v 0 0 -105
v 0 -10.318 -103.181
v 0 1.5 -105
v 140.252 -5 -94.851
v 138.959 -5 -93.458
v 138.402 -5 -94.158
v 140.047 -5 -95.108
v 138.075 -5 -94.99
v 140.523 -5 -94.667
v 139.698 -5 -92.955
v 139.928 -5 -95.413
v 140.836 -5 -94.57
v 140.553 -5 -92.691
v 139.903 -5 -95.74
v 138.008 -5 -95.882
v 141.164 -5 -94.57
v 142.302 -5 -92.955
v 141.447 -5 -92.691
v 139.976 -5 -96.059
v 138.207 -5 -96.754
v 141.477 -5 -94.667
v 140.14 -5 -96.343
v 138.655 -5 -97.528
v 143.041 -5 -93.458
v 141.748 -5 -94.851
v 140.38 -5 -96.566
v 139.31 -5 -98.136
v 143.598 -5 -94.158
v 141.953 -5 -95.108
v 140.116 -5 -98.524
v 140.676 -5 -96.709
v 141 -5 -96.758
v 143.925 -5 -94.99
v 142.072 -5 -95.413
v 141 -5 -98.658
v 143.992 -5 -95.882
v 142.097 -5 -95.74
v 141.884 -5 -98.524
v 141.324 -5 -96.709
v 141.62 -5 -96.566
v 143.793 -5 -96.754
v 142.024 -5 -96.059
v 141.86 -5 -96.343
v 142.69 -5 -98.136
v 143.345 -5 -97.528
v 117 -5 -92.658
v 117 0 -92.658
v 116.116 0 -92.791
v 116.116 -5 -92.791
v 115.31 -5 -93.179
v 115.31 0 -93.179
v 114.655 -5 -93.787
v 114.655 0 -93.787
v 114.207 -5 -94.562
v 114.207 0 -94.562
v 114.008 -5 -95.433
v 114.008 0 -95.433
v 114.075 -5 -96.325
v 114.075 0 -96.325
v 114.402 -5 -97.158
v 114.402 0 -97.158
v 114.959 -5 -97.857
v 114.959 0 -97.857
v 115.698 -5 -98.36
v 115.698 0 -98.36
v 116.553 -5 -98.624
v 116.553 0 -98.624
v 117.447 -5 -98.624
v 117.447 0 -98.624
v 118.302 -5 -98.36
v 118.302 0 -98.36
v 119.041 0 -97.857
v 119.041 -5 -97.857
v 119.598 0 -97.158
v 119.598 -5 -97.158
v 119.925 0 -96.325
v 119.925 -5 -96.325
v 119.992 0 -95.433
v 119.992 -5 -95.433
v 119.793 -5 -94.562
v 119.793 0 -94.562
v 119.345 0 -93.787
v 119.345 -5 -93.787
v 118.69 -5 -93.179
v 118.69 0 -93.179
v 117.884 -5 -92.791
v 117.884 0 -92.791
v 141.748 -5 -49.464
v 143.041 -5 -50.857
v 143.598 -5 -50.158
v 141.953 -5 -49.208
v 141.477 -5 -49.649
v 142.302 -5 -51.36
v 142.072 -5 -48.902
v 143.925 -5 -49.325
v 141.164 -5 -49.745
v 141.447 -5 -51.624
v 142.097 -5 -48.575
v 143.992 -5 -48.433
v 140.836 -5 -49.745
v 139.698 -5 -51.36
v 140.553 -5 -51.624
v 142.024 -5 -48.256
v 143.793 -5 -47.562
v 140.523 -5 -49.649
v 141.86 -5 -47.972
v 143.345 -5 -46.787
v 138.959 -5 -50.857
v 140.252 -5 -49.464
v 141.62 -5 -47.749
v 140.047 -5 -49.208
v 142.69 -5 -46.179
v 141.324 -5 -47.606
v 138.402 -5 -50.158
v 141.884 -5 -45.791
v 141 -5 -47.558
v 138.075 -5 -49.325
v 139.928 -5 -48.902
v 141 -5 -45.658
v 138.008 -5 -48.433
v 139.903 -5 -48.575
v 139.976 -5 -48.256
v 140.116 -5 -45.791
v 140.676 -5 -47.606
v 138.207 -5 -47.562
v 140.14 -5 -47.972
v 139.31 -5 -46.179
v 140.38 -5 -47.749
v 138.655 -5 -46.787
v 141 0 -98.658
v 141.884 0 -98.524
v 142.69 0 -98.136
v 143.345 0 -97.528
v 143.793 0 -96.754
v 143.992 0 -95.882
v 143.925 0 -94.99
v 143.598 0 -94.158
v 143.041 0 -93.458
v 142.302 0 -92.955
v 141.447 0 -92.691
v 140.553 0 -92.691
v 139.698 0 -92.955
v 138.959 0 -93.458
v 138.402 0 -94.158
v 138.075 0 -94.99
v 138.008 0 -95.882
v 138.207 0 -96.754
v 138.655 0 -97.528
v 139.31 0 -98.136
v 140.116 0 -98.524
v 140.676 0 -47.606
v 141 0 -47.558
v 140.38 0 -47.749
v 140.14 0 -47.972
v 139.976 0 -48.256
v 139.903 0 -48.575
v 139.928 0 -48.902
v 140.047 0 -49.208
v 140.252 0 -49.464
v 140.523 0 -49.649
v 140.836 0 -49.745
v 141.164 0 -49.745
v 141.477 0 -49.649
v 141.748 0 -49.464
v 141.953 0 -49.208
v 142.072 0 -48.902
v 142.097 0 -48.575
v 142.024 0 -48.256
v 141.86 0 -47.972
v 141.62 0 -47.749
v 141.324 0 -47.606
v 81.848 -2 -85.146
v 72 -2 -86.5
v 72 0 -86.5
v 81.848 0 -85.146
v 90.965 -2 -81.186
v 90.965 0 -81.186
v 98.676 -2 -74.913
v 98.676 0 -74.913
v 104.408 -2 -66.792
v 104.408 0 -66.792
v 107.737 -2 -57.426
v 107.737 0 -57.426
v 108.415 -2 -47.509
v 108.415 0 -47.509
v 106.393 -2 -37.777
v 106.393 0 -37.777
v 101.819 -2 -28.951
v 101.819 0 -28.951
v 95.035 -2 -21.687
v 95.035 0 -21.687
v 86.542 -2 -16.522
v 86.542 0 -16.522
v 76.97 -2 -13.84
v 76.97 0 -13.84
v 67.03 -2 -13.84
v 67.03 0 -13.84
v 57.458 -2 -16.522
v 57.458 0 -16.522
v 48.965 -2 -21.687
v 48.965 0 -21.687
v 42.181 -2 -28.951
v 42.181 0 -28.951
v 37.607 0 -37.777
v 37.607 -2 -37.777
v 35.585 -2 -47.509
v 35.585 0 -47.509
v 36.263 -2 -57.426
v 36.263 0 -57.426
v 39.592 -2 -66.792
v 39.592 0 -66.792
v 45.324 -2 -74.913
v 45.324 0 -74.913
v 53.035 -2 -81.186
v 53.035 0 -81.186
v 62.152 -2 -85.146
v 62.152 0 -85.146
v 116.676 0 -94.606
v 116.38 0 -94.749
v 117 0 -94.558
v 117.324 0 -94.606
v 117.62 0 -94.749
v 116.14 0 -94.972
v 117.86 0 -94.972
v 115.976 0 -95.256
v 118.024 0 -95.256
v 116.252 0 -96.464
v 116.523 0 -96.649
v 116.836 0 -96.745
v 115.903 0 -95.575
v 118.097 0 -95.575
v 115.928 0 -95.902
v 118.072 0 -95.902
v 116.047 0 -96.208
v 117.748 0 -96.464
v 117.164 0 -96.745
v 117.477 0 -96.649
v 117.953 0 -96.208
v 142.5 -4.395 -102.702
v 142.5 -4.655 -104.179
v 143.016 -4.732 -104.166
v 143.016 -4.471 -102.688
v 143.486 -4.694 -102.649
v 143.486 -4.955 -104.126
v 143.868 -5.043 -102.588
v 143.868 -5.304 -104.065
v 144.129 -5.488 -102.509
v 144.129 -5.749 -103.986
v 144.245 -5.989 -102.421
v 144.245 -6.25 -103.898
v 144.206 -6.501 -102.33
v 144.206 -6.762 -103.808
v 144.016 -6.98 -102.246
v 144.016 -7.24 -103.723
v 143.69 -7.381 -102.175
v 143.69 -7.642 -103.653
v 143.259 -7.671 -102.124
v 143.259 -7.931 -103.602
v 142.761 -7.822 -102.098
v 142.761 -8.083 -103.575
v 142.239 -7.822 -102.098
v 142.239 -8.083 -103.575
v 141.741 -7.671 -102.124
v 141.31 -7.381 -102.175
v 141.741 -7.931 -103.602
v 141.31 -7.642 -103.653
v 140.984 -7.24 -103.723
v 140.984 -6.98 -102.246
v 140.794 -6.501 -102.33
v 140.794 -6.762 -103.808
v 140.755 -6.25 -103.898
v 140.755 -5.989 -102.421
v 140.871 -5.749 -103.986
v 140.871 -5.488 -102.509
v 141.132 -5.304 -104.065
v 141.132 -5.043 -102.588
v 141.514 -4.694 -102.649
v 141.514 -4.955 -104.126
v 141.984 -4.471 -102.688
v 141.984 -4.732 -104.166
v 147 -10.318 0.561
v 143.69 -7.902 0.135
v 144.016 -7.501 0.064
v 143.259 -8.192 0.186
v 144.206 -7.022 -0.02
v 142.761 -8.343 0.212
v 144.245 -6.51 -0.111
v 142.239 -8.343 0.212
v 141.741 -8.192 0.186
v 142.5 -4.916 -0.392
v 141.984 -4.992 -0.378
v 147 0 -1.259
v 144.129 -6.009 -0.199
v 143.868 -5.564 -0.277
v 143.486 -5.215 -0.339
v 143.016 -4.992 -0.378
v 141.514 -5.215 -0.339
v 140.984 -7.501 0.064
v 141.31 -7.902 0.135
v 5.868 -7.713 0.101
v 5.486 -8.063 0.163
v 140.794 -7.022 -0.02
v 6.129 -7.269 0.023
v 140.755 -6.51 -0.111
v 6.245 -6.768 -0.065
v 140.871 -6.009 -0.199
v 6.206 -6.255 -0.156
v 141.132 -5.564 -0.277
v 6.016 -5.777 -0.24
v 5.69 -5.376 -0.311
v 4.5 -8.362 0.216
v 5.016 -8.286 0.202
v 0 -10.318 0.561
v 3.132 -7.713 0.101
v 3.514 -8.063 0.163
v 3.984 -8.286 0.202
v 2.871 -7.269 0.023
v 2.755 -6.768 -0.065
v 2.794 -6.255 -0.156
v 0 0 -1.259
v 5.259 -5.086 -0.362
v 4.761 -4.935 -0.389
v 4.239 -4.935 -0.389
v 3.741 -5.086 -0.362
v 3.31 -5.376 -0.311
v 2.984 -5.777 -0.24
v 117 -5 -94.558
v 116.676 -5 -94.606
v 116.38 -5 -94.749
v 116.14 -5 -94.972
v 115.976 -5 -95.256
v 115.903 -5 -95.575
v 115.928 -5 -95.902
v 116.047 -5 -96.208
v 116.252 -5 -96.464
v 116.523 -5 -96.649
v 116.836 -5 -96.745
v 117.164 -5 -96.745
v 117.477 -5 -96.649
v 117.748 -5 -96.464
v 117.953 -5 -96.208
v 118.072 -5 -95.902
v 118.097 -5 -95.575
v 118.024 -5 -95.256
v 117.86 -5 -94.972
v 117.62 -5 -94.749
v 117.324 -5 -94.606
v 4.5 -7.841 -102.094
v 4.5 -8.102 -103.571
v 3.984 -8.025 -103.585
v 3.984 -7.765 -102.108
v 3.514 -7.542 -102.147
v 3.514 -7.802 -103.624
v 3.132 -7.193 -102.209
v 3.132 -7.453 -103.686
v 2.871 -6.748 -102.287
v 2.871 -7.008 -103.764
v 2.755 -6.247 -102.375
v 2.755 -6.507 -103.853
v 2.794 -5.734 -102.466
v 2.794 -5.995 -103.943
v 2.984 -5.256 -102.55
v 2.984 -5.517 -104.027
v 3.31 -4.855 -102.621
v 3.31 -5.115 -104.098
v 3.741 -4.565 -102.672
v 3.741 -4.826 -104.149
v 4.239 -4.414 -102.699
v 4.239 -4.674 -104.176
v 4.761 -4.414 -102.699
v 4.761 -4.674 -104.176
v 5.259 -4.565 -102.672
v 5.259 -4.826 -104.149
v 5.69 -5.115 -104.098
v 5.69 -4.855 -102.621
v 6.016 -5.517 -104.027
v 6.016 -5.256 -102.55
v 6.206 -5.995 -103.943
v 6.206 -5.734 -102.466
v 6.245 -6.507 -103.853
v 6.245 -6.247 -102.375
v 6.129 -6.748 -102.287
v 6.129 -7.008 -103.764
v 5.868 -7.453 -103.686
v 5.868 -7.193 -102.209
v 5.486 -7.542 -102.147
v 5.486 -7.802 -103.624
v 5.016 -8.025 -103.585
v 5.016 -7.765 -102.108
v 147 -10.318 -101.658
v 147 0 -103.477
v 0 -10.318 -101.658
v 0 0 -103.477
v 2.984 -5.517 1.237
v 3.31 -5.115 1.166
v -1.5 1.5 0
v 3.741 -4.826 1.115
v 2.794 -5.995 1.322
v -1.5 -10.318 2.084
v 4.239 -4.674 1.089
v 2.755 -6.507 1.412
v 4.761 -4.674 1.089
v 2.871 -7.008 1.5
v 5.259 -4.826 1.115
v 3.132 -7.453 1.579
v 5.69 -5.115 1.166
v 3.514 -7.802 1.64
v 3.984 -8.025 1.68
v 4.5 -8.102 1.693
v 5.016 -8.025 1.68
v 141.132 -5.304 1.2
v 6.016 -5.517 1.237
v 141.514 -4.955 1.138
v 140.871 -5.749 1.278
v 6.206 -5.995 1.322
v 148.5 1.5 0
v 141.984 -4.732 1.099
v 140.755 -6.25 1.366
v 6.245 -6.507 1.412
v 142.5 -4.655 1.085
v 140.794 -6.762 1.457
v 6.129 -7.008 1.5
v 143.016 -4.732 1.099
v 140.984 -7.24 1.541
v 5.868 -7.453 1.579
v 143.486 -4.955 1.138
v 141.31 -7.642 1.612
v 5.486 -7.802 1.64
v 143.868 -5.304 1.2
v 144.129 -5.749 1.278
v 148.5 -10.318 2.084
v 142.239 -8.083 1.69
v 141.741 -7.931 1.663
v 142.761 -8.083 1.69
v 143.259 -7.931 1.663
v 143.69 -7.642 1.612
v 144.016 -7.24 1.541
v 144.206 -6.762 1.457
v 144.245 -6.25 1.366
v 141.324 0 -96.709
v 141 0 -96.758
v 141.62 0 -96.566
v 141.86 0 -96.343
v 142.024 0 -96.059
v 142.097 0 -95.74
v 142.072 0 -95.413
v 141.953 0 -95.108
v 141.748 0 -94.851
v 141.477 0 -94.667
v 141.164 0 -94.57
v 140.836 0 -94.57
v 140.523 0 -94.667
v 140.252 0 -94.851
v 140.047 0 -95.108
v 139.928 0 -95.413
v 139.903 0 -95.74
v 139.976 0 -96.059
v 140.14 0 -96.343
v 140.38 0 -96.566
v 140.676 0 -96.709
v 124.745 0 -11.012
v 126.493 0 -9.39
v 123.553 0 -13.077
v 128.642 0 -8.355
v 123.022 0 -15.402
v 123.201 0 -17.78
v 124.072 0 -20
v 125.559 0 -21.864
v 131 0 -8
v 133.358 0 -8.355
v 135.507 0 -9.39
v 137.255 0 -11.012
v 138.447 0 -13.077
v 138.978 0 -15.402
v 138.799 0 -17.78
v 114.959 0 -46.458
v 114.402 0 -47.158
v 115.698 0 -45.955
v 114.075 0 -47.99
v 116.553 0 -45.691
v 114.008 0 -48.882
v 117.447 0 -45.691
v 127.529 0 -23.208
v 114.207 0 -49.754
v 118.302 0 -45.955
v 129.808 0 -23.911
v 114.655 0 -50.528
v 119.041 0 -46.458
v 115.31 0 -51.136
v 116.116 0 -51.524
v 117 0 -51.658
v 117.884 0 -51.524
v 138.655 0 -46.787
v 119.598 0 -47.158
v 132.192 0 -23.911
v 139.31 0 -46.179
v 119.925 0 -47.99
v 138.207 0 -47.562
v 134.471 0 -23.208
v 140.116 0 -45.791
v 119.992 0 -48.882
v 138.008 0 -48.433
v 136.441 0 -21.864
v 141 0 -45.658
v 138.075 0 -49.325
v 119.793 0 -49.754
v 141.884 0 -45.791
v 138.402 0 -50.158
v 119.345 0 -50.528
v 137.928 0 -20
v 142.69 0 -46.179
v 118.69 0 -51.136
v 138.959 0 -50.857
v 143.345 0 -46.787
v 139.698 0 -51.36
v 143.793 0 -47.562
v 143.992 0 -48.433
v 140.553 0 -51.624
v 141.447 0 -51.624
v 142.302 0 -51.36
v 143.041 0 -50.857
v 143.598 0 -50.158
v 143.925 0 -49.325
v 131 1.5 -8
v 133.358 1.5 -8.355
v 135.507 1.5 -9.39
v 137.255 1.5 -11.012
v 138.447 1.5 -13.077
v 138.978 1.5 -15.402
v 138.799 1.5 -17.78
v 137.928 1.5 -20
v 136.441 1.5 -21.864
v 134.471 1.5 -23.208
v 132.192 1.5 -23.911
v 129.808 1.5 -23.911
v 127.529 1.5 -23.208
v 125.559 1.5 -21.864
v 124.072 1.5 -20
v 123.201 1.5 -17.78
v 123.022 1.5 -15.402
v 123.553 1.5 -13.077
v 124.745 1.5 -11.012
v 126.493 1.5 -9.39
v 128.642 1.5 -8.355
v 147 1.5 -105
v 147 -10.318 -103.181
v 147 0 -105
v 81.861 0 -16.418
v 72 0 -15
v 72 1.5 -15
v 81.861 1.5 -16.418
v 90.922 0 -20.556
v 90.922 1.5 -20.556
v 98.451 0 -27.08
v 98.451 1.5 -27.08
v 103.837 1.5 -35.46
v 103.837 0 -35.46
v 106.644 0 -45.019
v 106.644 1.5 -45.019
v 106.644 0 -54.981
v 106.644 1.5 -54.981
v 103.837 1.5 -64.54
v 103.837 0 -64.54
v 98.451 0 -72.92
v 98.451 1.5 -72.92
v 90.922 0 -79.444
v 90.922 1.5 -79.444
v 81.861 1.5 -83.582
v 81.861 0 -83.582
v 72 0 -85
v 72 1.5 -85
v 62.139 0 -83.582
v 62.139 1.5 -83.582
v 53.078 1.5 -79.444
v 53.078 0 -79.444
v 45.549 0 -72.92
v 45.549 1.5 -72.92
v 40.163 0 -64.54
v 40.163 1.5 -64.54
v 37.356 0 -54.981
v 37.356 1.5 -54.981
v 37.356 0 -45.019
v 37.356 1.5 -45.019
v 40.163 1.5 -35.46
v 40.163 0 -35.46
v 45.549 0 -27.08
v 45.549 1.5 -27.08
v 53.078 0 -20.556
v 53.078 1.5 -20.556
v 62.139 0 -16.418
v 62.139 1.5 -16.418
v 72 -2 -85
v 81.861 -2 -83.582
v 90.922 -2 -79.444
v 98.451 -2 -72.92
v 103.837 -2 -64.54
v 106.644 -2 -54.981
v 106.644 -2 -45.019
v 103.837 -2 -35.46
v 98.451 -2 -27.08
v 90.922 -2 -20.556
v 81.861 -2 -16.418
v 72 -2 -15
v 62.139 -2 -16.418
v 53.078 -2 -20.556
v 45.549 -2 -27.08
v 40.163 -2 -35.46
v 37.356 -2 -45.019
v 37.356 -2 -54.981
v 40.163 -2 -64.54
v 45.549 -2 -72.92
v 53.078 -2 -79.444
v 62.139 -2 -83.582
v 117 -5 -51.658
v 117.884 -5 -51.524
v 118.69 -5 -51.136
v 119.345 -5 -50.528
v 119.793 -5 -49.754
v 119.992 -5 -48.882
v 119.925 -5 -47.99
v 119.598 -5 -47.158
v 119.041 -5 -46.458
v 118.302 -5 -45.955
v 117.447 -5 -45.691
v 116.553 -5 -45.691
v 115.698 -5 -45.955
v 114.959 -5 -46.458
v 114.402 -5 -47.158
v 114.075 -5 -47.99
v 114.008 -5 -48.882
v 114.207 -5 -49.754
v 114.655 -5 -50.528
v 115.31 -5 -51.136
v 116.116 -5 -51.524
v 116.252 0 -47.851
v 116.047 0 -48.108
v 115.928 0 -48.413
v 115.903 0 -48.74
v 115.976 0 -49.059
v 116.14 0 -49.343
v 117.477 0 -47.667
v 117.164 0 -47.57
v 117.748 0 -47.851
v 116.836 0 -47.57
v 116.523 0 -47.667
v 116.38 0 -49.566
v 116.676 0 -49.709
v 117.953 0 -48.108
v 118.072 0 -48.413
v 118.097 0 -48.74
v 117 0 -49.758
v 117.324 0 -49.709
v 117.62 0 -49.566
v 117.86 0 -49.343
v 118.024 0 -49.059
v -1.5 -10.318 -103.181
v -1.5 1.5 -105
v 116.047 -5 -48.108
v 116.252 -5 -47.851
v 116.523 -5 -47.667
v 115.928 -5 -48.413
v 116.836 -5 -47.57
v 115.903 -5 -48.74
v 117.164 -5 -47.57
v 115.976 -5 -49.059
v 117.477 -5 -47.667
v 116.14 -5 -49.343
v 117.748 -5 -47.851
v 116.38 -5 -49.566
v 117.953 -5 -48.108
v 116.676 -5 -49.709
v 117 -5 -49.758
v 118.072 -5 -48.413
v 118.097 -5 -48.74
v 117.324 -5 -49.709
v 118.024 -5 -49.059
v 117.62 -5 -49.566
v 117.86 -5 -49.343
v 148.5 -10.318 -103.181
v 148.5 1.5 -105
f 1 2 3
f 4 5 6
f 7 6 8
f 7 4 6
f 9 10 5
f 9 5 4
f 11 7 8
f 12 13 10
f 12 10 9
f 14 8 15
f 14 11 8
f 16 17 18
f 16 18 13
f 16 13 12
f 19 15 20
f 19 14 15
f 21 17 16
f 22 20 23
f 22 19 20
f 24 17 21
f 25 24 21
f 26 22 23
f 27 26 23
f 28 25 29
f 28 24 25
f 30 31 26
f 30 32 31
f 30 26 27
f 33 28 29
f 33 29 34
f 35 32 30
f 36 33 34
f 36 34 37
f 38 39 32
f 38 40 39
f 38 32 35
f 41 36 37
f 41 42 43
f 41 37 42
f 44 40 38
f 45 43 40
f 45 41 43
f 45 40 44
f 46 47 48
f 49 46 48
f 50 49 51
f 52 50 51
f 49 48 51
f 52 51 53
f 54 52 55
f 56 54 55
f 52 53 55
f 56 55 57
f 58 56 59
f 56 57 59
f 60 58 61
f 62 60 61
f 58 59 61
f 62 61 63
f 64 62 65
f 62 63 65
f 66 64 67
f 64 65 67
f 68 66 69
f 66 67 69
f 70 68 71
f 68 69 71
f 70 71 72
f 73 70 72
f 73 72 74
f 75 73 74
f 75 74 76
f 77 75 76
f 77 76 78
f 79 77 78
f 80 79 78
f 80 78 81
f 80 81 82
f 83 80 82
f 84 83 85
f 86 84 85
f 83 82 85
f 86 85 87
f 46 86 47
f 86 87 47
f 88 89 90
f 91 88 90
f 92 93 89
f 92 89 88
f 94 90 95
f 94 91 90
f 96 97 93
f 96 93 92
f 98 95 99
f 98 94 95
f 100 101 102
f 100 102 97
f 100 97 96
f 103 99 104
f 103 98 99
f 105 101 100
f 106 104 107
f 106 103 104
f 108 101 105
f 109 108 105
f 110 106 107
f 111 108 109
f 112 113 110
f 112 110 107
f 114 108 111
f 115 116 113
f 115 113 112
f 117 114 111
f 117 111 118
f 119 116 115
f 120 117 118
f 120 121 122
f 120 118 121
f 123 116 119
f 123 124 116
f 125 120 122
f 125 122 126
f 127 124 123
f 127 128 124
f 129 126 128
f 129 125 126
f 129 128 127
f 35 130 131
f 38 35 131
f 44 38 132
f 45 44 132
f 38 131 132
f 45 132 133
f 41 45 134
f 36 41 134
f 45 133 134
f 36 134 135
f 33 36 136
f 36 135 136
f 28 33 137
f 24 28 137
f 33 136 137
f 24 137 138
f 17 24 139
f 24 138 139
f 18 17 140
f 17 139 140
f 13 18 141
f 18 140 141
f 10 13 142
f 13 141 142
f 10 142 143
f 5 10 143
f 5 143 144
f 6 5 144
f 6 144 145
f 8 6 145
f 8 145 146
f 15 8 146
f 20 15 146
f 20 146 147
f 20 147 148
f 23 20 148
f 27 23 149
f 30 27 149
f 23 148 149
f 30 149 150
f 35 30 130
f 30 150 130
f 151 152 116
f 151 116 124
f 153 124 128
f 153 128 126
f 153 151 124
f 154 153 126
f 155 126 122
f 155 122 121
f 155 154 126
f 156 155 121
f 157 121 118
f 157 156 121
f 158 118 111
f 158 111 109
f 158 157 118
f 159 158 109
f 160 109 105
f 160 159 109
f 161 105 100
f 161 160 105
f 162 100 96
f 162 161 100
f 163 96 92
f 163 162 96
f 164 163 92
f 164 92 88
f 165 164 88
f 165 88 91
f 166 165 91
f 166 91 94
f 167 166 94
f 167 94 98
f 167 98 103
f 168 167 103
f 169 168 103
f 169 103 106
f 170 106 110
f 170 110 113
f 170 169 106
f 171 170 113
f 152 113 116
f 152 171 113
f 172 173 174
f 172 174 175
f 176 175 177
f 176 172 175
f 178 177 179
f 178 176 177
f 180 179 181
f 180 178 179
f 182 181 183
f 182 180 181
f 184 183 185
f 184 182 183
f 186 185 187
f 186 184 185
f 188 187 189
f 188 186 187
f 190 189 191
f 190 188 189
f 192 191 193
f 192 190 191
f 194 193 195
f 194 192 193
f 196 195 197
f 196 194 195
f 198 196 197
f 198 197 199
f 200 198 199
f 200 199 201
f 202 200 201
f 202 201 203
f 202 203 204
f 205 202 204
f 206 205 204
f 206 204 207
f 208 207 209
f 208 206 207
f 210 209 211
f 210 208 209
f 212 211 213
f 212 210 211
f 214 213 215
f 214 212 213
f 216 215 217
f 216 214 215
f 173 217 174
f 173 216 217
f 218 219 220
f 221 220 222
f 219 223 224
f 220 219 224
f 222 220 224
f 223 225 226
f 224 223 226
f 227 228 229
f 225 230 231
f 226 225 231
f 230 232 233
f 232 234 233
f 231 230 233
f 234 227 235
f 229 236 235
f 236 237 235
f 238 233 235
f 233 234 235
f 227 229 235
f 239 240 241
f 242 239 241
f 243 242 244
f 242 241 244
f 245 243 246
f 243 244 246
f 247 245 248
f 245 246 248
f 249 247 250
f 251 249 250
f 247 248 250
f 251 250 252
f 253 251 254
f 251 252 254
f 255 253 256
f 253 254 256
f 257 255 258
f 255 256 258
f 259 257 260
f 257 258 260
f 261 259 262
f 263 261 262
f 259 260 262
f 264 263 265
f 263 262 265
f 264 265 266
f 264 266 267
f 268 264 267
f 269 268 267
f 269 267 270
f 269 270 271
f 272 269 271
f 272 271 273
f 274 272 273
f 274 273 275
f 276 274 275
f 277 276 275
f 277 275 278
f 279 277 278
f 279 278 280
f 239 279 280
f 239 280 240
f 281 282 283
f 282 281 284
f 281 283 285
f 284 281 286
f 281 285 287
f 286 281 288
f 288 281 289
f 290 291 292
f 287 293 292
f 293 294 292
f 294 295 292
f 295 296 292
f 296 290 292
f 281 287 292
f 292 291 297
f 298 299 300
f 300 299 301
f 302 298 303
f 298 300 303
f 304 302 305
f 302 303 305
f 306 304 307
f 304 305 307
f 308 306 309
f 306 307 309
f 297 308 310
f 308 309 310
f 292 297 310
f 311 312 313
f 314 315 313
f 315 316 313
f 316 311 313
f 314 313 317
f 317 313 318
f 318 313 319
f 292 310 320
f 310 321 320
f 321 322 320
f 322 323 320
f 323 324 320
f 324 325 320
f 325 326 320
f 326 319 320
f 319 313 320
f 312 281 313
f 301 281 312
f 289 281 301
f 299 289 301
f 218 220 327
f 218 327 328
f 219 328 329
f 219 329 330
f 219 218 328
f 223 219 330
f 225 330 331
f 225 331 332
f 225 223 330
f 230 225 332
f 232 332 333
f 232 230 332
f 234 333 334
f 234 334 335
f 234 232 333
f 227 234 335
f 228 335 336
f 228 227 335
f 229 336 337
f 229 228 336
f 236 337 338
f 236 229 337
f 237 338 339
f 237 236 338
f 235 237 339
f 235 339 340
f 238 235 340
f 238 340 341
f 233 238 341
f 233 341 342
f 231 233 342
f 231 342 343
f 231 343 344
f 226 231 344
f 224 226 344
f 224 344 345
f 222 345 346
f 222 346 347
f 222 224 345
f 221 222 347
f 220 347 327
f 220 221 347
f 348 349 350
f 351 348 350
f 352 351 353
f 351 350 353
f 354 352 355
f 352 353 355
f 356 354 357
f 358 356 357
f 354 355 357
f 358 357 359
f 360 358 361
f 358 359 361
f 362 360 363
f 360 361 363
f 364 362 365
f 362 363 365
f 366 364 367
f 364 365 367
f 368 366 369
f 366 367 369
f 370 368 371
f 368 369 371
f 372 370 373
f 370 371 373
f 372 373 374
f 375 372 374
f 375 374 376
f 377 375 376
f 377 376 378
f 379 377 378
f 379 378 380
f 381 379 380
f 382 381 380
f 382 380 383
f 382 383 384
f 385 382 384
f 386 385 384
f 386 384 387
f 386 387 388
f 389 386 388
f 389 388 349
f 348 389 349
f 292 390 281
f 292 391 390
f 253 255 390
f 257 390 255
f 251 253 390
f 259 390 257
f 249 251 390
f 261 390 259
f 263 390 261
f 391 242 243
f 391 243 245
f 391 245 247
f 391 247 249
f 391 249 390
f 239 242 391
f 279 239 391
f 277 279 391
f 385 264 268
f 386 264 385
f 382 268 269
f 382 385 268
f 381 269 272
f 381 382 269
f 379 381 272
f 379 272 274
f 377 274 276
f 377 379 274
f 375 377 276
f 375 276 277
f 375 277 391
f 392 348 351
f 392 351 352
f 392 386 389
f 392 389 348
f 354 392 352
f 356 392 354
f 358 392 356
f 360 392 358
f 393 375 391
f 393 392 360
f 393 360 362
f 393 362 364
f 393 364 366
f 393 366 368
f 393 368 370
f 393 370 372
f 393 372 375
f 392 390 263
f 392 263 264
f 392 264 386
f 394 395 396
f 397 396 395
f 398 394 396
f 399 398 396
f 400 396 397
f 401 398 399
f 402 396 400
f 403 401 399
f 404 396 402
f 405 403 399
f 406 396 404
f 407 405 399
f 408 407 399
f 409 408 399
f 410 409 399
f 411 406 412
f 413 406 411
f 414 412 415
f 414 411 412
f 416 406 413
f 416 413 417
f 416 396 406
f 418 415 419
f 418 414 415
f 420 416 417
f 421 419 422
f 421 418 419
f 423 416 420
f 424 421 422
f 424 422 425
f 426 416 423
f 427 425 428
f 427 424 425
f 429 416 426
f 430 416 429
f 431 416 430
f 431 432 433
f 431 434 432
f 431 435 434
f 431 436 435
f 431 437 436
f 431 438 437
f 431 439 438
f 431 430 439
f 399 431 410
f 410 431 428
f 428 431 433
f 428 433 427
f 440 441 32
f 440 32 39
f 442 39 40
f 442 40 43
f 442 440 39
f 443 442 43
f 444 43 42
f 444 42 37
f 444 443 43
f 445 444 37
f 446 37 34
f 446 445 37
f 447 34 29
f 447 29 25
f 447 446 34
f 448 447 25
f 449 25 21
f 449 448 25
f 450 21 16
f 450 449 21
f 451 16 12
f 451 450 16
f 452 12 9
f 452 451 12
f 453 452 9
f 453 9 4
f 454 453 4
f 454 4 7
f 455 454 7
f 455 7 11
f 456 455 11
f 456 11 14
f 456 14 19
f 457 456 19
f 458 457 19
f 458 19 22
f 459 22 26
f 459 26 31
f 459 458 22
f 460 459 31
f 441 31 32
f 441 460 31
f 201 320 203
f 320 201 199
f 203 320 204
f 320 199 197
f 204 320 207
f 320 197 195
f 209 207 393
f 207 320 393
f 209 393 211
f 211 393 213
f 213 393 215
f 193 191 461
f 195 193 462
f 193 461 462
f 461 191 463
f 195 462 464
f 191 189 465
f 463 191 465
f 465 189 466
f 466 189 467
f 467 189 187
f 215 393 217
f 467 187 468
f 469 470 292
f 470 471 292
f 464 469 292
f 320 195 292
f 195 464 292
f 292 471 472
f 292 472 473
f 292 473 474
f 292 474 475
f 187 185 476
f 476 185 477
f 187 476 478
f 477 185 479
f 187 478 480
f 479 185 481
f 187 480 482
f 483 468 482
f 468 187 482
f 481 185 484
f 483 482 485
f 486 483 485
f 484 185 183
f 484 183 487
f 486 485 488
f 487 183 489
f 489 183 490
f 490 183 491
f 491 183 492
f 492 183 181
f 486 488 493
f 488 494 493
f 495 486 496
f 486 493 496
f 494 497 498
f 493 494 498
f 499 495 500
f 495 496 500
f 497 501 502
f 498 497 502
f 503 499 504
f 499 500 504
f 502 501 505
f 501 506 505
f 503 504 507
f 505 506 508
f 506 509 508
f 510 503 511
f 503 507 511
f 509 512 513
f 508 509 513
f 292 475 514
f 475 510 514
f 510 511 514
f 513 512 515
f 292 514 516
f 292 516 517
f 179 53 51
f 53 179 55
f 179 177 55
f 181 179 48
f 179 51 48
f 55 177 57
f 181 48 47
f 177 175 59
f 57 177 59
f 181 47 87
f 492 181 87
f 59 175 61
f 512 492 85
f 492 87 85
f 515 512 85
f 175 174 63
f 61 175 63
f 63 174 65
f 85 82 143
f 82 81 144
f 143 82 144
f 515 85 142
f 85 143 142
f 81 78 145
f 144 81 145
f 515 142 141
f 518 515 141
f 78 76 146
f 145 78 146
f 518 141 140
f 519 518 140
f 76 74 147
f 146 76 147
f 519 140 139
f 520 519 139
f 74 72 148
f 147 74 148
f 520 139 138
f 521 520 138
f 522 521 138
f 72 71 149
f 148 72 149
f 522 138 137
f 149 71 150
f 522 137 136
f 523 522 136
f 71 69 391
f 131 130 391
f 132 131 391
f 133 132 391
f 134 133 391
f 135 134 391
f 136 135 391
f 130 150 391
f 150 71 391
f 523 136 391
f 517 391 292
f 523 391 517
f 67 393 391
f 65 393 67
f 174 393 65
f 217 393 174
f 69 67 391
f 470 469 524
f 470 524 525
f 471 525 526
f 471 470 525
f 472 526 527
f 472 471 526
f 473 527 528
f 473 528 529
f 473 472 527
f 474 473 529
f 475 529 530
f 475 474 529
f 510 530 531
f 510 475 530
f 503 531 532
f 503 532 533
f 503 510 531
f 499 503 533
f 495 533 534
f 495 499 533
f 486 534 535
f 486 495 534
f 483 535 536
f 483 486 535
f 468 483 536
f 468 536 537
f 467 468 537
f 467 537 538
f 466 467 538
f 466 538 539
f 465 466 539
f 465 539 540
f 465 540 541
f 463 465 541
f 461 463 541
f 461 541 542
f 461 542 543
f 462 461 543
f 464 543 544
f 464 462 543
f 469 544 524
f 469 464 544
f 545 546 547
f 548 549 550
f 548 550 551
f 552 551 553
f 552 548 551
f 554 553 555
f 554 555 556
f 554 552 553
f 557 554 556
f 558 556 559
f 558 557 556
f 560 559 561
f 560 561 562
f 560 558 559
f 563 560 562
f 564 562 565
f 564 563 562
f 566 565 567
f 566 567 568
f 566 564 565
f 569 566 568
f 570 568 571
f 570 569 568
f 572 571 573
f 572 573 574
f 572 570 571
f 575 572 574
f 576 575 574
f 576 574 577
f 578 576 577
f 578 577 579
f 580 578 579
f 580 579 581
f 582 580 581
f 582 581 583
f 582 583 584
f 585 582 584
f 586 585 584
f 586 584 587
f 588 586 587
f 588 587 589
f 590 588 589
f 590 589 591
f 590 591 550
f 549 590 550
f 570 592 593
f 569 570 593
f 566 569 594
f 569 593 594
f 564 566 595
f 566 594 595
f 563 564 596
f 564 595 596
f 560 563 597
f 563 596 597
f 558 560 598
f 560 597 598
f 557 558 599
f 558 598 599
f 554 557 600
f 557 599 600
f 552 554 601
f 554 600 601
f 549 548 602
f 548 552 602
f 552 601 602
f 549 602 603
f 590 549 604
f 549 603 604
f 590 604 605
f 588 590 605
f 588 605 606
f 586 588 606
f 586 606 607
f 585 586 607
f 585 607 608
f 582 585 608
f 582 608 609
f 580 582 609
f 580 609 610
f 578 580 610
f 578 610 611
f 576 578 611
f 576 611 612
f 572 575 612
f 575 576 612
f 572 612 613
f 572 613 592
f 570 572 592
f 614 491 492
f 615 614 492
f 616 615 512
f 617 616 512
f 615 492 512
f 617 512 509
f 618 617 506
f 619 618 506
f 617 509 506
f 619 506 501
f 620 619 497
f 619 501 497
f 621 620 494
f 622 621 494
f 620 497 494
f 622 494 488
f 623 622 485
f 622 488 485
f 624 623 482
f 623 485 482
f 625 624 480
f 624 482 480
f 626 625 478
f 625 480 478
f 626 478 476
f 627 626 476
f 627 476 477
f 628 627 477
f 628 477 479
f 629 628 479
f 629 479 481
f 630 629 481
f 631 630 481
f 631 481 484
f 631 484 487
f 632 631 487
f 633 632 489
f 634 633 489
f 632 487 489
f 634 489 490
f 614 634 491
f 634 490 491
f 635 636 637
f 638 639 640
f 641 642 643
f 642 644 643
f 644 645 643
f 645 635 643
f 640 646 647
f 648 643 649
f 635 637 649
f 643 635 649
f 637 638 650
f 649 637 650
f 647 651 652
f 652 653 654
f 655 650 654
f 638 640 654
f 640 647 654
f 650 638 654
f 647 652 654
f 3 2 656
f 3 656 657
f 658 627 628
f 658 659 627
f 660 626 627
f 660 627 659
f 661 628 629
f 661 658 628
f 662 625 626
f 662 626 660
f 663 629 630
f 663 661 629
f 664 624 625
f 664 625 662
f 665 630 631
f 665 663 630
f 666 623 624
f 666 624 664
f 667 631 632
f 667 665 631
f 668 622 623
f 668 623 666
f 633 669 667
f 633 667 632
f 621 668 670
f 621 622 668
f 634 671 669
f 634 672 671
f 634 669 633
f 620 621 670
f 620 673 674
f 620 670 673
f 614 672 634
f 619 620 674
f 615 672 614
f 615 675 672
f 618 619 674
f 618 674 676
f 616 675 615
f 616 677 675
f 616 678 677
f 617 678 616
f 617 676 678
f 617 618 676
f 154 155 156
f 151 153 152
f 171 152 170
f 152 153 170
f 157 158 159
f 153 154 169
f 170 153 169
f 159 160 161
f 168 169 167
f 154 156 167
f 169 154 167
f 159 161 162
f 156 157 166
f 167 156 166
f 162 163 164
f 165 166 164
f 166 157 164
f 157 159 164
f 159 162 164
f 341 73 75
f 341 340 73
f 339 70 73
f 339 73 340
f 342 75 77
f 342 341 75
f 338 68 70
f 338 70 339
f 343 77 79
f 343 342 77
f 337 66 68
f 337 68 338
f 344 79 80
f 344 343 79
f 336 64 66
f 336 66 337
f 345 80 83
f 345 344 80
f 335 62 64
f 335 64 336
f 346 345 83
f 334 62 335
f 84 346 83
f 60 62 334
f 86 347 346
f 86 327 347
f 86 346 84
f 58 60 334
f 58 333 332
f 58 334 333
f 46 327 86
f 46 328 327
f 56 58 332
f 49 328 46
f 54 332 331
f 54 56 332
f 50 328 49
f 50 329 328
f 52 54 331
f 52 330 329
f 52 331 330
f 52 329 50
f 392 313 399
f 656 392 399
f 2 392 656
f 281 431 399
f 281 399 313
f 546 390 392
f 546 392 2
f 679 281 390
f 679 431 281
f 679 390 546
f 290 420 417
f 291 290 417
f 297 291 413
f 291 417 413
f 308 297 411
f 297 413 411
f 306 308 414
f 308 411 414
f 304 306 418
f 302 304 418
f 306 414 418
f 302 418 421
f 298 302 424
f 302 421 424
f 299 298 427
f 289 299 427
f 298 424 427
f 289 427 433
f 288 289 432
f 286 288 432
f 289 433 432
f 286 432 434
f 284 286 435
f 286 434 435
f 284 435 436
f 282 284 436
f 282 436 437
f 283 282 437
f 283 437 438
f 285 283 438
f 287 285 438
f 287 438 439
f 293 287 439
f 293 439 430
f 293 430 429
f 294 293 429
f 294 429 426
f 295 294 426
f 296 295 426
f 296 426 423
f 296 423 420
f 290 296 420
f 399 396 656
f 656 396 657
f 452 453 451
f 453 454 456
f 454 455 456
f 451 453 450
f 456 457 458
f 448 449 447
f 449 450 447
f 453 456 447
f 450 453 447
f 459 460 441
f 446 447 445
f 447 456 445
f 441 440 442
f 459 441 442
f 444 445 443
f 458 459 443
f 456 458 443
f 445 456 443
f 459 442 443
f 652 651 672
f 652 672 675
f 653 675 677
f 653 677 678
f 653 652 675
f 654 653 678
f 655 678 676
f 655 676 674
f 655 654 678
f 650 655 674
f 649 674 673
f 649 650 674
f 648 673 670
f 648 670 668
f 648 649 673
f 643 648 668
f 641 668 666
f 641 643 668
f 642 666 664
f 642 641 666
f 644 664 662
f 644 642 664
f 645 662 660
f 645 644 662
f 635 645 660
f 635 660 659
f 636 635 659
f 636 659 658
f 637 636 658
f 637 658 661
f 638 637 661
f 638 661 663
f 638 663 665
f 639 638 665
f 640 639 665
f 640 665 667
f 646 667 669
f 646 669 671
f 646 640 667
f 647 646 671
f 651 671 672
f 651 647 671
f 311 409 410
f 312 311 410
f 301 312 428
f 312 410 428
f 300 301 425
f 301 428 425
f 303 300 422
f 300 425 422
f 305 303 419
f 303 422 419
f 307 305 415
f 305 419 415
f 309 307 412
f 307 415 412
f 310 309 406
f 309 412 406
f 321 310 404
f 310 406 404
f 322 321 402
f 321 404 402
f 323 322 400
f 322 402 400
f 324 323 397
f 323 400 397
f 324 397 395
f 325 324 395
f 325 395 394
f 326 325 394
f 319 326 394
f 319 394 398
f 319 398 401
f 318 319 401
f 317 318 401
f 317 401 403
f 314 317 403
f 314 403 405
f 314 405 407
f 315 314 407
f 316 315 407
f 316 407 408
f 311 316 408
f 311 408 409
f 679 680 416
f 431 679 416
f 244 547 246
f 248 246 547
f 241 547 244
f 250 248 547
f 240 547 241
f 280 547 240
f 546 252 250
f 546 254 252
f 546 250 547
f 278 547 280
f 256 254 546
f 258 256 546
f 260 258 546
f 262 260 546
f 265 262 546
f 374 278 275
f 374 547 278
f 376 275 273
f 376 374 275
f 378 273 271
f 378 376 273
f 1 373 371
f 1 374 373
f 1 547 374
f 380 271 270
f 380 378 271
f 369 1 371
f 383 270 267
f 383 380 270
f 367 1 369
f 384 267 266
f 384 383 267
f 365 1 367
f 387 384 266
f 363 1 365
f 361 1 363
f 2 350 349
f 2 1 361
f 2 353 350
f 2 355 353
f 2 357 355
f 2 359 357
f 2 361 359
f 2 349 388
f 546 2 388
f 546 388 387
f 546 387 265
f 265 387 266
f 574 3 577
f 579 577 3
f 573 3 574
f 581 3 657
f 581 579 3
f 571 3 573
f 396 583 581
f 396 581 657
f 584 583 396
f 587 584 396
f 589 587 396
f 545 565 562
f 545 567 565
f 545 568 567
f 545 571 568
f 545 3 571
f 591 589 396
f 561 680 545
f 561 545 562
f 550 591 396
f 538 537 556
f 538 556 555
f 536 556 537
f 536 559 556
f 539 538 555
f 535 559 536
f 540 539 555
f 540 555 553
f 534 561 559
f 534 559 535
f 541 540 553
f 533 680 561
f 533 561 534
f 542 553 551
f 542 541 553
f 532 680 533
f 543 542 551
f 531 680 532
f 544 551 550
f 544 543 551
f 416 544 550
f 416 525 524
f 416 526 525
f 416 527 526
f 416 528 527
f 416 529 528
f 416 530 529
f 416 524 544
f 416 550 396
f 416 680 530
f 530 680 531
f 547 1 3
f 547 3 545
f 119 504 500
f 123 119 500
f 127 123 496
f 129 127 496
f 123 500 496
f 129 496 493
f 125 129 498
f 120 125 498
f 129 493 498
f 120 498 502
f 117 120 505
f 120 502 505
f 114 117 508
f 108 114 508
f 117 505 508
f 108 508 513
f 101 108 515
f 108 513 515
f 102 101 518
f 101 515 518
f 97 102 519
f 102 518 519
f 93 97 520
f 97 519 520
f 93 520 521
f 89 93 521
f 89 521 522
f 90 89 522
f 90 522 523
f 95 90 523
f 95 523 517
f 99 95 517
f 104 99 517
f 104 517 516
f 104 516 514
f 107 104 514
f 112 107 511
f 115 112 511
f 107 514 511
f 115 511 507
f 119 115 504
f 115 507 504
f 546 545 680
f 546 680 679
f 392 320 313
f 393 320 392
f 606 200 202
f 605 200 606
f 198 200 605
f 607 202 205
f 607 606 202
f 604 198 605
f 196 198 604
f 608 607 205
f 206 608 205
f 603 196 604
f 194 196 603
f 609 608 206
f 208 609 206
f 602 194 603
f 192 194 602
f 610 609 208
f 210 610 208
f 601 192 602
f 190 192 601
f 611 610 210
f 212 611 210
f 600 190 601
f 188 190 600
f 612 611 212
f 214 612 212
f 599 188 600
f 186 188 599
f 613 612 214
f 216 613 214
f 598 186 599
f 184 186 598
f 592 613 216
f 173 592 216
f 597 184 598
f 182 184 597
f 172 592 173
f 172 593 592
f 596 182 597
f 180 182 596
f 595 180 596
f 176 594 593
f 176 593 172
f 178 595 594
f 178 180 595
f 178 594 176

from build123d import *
from build123d.topology import SkipClean

# Parameters (mm, degrees)
SKETCH_1_W          = 147
SKETCH_1_H          = 105
SKETCH_1_R          = 35
SKETCH_1_R_2        = 8
EXTRUDE_1_DEPTH     = 1.5
EXTRUDE_2_DEPTH     = 147
EXTRUDE_3_DEPTH     = 1.5
EXTRUDE_4_DEPTH     = 1.5
SKETCH_5_R          = 3
SKETCH_5_R_2        = 1.1
EXTRUDE_5_DEPTH     = 5
CUT_EXTRUDE_1_REACH = 184.29
SKETCH_6_R          = 1.75
CUT_EXTRUDE_2_REACH = 184.314
SKETCH_7_R          = 1.75
EXTRUDE_START       = 2
SKETCH_8_R          = 36.5
SKETCH_8_R_2        = 35
EXTRUDE_6_DEPTH     = 2


with BuildPart() as part:
    # 草图1 → 凸台-拉伸1 (new body)
    with BuildSketch(Plane(origin=(0, 0, 0), x_dir=(1, 0, 0), z_dir=(0, 1, 0))):
        with Locations((73.5, 52.5)):
            Rectangle(SKETCH_1_W, SKETCH_1_H)
        with Locations(Location((72, 50, 0), (0, 0, 270))):
            Circle(SKETCH_1_R, mode=Mode.SUBTRACT)
        with Locations(Location((131, 16, 0), (0, 0, 270))):
            Circle(SKETCH_1_R_2, mode=Mode.SUBTRACT)
    extrude(amount=EXTRUDE_1_DEPTH)

    # 草图2 → 凸台-拉伸2 (add)
    with BuildSketch(Plane.ZY):
        Polygon((0, 1.5), (2.083778132, -10.317693036), (0.560638214, -10.317693036), (-1.523139918, 1.5), align=None)
        Polygon((-105, 0), (-103.180712339, -10.317693036), (-101.657572421, -10.317693036), (-103.741350553, 1.5), align=None)
    extrude(amount=-EXTRUDE_2_DEPTH)

    # 草图3 → 凸台-拉伸3 (add)
    with BuildSketch(Plane(origin=(147, 0, 0), x_dir=(0, 0, -1), z_dir=(1, 0, 0))):
        Polygon((-2.083778132, -10.317693036), (0, 1.5), (105, 1.5), (103.180712339, -10.317693036), align=None)
    extrude(amount=EXTRUDE_3_DEPTH)

    # 草图4 → 凸台-拉伸4 (add)
    with BuildSketch(Plane.ZY):
        Polygon((-103.180712339, -10.317693036), (-105, 1.5), (0, 1.5), (2.083778132, -10.317693036), align=None)
    extrude(amount=EXTRUDE_4_DEPTH)

    # 草图5 → 凸台-拉伸5 (add)
    # profile 1 of 4: a face of its own
    with BuildSketch(Plane.XZ):
        with Locations(Location((141, -95.657572421, 0), (0, 0, 270))):
            Circle(SKETCH_5_R)
        with Locations(Location((141, -95.657572421, 0), (0, 0, 270))):
            Circle(SKETCH_5_R_2, mode=Mode.SUBTRACT)
    # profile 2 of 4: a face of its own
    with BuildSketch(Plane.XZ):
        with Locations(Location((117, -95.657572421, 0), (0, 0, 90))):
            Circle(SKETCH_5_R)
        with Locations(Location((117, -95.657572421, 0), (0, 0, 90))):
            Circle(SKETCH_5_R_2, mode=Mode.SUBTRACT)
    # profile 3 of 4: a face of its own
    with BuildSketch(Plane.XZ):
        with Locations(Location((117, -48.657572421, 0), (0, 0, 270))):
            Circle(SKETCH_5_R)
        with Locations(Location((117, -48.657572421, 0), (0, 0, 270))):
            Circle(SKETCH_5_R_2, mode=Mode.SUBTRACT)
    # profile 4 of 4: a face of its own
    with BuildSketch(Plane.XZ):
        with Locations(Location((141, -48.657572421, 0), (0, 0, 90))):
            Circle(SKETCH_5_R)
        with Locations(Location((141, -48.657572421, 0), (0, 0, 90))):
            Circle(SKETCH_5_R_2, mode=Mode.SUBTRACT)
    extrude(amount=EXTRUDE_5_DEPTH)

    # 草图6 → 切除-拉伸1 (cut, up to next)
    with BuildSketch(Plane(origin=(0, -17.956057525, -101.833862591), x_dir=(-1, 0, 0), z_dir=(0, -0.17364817766692459, -0.9848077530122091)), mode=Mode.PRIVATE) as cut_extrude_1_sk1:
        with Locations(Location((-142.5, 11.756198573, 0), (0, 0, 90))):
            Circle(SKETCH_6_R)
    cut_extrude_1_tool1 = extrude(cut_extrude_1_sk1.sketch, amount=-CUT_EXTRUDE_1_REACH, mode=Mode.PRIVATE) & part.part
    # 草图6 → 切除-拉伸1 (cut, up to next)
    with BuildSketch(Plane(origin=(0, -17.956057525, -101.833862591), x_dir=(-1, 0, 0), z_dir=(0, -0.17364817766692459, -0.9848077530122091)), mode=Mode.PRIVATE) as cut_extrude_1_sk2:
        with Locations(Location((-4.5, 11.756198573, 0), (0, 0, 270))):
            Circle(SKETCH_6_R)
    cut_extrude_1_tool2 = extrude(cut_extrude_1_sk2.sketch, amount=-CUT_EXTRUDE_1_REACH, mode=Mode.PRIVATE) & part.part
    add(cut_extrude_1_tool1.solids().sort_by_distance((142.5, -6.378462, -103.875305))[0], mode=Mode.SUBTRACT)
    add(cut_extrude_1_tool2.solids().sort_by_distance((4.5, -6.378462, -103.875305))[0], mode=Mode.SUBTRACT)

    # 草图7 → 切除-拉伸2 (cut, up to next)
    with BuildSketch(Plane(origin=(0, 0.045230534, 0.256515107), x_dir=(1, 0, 0), z_dir=(0, 0.1736481776669238, 0.9848077530122094)), mode=Mode.PRIVATE) as cut_extrude_2_sk1:
        with Locations(Location((4.5, -6.52278837, 0), (0, 0, 270))):
            Circle(SKETCH_7_R)
    cut_extrude_2_tool1 = extrude(cut_extrude_2_sk1.sketch, amount=-CUT_EXTRUDE_2_REACH, mode=Mode.PRIVATE) & part.part
    # 草图7 → 切除-拉伸2 (cut, up to next)
    with BuildSketch(Plane(origin=(0, 0.045230534, 0.256515107), x_dir=(1, 0, 0), z_dir=(0, 0.1736481776669238, 0.9848077530122094)), mode=Mode.PRIVATE) as cut_extrude_2_sk2:
        with Locations(Location((142.5, -6.52278837, 0), (0, 0, 90))):
            Circle(SKETCH_7_R)
    cut_extrude_2_tool2 = extrude(cut_extrude_2_sk2.sketch, amount=-CUT_EXTRUDE_2_REACH, mode=Mode.PRIVATE) & part.part
    add(cut_extrude_2_tool1.solids().sort_by_distance((4.5, -6.378462, 1.389185))[0], mode=Mode.SUBTRACT)
    add(cut_extrude_2_tool2.solids().sort_by_distance((142.5, -6.378462, 1.389185))[0], mode=Mode.SUBTRACT)

    # 草图8 → 凸台-拉伸6 (add)
    with SkipClean():  # the faces are left unmerged after this step: merging them gives an invalid solid
        with BuildSketch(Plane.XZ.offset(EXTRUDE_START)):
            with Locations(Location((72, -50, 0), (0, 0, 270))):
                Circle(SKETCH_8_R)
            with Locations(Location((72, -50, 0), (0, 0, 270))):
                Circle(SKETCH_8_R_2, mode=Mode.SUBTRACT)
        extrude(amount=-EXTRUDE_6_DEPTH)


solid = part.part
